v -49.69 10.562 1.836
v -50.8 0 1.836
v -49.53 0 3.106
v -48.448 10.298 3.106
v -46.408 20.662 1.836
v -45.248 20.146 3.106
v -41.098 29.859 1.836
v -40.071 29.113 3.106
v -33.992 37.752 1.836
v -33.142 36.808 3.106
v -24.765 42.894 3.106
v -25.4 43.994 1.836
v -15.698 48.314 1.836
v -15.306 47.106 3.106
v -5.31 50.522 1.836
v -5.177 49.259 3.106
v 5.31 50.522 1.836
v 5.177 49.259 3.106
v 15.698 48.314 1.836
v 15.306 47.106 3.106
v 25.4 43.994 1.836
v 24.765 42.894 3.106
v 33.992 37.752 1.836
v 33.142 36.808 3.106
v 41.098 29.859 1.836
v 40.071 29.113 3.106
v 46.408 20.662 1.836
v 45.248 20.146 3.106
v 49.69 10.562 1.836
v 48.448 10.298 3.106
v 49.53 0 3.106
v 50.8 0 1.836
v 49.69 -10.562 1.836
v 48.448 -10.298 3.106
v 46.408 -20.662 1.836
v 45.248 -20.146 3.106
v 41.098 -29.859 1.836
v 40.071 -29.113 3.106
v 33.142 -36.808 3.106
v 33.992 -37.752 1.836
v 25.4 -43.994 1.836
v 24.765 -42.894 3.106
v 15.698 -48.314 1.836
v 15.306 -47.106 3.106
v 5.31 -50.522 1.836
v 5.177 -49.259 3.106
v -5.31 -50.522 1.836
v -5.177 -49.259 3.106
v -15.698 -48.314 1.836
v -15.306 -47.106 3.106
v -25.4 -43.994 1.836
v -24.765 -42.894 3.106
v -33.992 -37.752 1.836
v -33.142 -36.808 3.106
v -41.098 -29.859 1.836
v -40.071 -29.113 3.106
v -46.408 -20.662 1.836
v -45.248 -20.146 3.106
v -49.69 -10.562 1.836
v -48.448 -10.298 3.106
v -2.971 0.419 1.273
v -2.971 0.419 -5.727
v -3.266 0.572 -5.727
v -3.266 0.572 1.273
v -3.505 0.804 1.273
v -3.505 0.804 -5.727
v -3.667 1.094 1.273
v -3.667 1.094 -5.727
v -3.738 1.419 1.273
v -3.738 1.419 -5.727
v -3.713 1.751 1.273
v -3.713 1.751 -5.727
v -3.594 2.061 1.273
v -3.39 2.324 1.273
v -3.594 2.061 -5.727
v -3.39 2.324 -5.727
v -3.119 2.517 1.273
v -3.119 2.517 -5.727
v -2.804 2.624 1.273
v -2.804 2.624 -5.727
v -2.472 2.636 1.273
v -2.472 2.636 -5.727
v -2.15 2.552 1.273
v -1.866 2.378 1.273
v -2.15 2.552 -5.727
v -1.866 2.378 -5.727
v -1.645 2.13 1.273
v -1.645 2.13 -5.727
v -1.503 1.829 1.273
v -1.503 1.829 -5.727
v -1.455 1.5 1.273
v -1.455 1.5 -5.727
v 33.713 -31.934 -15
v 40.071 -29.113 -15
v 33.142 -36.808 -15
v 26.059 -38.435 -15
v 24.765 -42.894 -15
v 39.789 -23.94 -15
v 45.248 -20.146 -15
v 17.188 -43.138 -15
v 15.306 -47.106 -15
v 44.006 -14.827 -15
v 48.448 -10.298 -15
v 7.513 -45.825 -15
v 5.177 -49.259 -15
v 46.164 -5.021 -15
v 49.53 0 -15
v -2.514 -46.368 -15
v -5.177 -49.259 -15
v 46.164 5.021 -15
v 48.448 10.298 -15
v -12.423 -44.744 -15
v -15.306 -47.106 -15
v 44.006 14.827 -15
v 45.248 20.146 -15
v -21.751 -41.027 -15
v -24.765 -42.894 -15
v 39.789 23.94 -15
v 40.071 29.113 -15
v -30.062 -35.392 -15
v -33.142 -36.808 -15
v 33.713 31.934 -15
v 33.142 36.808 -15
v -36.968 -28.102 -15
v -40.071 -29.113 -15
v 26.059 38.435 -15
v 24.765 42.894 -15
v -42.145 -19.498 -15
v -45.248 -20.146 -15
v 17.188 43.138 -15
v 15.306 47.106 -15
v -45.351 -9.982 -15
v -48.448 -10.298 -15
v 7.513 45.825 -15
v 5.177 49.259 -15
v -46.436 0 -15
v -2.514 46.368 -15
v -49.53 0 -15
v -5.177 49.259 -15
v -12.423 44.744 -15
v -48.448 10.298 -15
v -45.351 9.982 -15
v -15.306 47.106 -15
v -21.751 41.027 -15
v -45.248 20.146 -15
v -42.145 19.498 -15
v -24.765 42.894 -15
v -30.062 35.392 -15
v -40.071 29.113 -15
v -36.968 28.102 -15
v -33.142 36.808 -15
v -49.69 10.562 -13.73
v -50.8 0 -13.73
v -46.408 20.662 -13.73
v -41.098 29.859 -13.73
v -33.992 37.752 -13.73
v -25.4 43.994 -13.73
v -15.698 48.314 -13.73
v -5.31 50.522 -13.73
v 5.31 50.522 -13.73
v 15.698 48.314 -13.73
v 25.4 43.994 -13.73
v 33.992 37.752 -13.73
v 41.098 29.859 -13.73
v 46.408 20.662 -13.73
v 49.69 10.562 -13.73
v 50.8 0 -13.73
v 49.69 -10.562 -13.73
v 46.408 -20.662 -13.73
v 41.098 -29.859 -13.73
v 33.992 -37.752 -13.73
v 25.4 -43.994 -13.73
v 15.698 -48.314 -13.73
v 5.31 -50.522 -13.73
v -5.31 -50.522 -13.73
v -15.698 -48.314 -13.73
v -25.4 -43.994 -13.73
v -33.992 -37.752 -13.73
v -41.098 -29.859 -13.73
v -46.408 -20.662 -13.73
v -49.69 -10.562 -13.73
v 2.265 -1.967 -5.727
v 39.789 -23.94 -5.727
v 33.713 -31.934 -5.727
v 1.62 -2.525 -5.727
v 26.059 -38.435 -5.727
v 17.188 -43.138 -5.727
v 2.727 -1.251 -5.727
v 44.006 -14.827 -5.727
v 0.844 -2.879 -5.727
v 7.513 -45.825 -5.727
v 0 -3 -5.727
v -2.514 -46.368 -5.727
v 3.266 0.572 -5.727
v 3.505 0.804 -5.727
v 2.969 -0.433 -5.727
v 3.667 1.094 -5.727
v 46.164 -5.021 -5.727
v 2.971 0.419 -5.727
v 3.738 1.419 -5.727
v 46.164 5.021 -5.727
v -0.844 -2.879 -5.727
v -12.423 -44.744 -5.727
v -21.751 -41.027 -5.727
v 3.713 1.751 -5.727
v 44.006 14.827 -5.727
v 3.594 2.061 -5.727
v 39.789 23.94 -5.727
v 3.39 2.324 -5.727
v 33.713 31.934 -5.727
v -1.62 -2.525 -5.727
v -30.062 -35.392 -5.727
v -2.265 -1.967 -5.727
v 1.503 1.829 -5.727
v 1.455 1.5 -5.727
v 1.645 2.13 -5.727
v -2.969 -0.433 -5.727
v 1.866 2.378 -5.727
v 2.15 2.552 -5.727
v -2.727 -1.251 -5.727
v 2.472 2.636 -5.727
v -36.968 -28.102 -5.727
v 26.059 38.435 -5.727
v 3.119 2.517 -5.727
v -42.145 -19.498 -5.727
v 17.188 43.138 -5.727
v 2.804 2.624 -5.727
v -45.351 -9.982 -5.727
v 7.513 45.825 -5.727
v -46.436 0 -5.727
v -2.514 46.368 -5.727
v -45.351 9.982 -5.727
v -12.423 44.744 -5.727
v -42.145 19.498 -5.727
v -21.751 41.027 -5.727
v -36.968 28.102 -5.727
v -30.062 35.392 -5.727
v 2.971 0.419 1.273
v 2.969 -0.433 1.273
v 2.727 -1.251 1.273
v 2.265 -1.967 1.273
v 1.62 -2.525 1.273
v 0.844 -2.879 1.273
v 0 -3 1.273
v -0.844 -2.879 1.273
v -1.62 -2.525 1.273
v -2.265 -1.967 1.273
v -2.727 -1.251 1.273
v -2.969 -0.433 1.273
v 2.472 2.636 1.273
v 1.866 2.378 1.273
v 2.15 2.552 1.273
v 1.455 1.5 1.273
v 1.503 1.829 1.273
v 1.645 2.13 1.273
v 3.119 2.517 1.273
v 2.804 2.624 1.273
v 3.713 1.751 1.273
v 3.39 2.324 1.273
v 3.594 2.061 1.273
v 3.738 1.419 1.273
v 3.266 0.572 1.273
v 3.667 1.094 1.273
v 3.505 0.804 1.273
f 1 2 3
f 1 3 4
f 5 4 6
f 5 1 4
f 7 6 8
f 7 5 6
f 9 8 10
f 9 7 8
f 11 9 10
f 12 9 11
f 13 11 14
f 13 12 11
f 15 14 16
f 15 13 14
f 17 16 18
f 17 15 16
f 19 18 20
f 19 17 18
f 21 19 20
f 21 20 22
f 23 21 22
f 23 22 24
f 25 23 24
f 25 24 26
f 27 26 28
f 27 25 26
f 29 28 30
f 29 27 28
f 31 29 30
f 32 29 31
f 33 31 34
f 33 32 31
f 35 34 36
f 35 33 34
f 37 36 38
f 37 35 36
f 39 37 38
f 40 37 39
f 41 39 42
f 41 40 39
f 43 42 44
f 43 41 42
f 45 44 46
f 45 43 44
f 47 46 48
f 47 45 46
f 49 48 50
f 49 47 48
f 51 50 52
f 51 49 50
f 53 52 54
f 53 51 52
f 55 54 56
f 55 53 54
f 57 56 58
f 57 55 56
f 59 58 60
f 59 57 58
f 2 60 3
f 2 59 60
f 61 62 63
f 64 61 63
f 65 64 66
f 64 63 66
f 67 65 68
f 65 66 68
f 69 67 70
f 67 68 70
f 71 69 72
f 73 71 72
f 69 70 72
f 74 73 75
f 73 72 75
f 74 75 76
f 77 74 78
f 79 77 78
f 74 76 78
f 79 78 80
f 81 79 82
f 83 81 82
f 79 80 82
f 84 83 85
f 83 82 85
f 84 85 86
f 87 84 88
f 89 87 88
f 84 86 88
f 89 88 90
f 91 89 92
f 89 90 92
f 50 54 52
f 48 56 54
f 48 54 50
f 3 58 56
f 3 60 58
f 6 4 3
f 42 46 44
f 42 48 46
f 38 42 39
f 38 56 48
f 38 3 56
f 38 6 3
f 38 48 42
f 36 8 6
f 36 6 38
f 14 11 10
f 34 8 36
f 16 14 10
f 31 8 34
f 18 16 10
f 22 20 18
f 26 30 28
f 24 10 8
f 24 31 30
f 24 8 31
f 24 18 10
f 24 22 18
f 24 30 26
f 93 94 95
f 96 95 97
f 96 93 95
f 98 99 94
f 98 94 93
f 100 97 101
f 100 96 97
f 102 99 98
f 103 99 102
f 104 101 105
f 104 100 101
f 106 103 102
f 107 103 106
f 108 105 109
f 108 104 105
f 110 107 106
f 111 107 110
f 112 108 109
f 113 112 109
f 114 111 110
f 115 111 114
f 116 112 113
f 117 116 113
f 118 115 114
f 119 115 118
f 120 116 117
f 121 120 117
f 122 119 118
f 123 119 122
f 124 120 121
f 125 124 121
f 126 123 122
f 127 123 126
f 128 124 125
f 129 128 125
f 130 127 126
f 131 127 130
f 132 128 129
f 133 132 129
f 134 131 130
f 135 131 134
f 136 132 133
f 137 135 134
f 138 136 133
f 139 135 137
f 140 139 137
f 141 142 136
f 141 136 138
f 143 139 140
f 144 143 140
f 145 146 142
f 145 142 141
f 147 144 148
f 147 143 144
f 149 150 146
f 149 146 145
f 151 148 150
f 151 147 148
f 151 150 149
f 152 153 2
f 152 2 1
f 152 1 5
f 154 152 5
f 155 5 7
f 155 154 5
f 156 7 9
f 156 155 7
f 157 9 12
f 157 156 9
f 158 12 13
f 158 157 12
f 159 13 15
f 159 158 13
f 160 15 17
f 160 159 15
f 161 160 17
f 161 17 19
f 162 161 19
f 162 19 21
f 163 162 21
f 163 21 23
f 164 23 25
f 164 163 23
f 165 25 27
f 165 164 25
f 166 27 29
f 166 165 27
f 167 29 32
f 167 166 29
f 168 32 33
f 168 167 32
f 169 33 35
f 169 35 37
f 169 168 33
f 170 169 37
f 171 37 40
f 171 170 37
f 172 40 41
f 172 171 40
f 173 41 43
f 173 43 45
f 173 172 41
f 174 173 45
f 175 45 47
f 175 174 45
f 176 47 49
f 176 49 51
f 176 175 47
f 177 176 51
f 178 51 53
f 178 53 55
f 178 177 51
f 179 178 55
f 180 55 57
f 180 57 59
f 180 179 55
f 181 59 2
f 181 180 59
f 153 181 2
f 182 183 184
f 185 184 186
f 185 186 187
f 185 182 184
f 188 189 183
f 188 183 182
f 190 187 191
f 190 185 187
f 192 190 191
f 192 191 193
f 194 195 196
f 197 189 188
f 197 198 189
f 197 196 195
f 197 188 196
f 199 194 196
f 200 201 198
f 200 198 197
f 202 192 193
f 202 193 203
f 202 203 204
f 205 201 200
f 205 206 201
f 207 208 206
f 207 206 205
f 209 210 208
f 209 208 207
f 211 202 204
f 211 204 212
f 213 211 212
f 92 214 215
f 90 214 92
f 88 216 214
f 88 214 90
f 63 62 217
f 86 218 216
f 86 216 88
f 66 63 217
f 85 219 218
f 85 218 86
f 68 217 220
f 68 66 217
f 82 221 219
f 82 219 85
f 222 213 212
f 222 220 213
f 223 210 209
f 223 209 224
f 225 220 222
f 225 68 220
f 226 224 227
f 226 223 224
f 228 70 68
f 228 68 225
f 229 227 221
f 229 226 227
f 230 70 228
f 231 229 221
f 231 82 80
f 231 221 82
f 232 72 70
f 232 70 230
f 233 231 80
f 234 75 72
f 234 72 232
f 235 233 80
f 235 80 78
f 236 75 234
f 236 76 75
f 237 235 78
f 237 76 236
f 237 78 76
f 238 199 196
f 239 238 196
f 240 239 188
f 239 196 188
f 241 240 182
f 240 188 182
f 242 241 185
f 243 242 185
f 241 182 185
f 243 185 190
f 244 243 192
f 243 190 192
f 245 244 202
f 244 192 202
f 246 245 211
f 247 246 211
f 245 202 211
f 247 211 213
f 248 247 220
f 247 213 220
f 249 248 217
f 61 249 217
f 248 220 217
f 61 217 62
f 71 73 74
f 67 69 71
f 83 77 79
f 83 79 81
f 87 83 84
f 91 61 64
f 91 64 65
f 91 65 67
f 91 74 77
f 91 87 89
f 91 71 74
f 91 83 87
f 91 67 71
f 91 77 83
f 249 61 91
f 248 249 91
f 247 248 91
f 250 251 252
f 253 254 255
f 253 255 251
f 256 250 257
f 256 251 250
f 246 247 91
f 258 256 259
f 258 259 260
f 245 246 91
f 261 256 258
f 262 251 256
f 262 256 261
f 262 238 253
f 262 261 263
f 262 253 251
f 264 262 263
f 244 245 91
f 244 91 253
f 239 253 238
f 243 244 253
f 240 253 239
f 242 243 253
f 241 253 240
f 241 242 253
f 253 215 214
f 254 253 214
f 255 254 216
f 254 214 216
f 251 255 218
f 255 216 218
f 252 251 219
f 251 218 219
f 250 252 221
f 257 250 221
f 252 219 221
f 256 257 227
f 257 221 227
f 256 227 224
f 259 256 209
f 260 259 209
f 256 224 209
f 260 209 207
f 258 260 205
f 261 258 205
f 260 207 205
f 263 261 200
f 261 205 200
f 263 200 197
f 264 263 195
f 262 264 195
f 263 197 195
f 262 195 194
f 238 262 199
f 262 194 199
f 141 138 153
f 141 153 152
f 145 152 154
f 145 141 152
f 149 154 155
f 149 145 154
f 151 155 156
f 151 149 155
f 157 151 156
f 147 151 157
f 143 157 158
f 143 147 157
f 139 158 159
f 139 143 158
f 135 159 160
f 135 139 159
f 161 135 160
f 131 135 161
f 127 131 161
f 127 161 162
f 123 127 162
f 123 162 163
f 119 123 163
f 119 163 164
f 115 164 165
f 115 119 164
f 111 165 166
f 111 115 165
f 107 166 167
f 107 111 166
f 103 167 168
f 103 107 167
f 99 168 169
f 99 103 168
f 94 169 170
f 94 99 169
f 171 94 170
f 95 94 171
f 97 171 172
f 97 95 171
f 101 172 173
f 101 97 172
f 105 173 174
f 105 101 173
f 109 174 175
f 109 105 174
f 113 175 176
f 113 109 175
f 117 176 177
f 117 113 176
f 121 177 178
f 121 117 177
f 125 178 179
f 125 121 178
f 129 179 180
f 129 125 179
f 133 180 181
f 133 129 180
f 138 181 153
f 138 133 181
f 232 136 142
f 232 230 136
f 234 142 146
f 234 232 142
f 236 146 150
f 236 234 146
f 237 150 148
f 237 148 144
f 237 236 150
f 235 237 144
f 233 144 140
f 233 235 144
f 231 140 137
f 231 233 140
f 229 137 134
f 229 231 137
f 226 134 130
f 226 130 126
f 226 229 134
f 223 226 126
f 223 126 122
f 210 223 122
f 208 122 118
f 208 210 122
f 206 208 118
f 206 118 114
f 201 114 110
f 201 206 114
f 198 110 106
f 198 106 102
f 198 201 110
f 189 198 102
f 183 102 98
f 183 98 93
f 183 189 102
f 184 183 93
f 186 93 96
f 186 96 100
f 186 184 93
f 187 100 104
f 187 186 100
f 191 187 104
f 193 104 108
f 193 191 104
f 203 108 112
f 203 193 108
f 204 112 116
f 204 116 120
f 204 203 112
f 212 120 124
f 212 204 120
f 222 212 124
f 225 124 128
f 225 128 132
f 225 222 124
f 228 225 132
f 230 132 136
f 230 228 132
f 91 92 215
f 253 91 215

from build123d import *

# Parameters (mm, degrees)
F2_SIZE  = 1.27
F4_DEPTH = 7
F5_SIZE  = 1.27


with BuildPart() as f1:
    # F0 (on Front) → F1 (revolve)
    with BuildSketch(Plane.XZ):
        Polygon((0, 0), (0, 3.1056862596), (-50.8, 3.1056862596), (-50.8, -15), (-46.4363807935, -15), (-46.4363807935, -5.7271113946), (-1, -5.7271113946), (-1, 0), align=None)
    revolve(axis=Axis((0, 0, 4.3935226277), (0, 0, -1)))

    # F2
    f2_edges = [f1.edges().sort_by_distance(p)[0] for p in [
        (50.8, 0, 3.105686),
    ]]
    chamfer(f2_edges, length=F2_SIZE)

    # F3 (on face) → F4 (cut)
    with BuildSketch(Plane(origin=(0, 0, -5.7271113946), x_dir=(1, 0, 0), z_dir=(0, 0, -1))):
        with BuildLine():
            ThreePointArc((-2.9705407732, -0.4193894549), (-3.2616732298, -2.4306384889), (-1.4550762114, -1.5))
            Line((-1.4550762114, -1.5), (1.4550762114, -1.5))
            ThreePointArc((1.4550762114, -1.5), (3.2616732298, -2.4306384889), (2.9705407732, -0.4193894549))
            ThreePointArc((2.9705407732, -0.4193894549), (0, 3), (-2.9705407732, -0.4193894549))
        make_face()
    extrude(amount=-F4_DEPTH, mode=Mode.SUBTRACT)

    # F5
    f5_edges = [f1.edges().sort_by_distance(p)[0] for p in [
        (50.8, 0, -15),
    ]]
    chamfer(f5_edges, length=F5_SIZE)


solid = f1.part
